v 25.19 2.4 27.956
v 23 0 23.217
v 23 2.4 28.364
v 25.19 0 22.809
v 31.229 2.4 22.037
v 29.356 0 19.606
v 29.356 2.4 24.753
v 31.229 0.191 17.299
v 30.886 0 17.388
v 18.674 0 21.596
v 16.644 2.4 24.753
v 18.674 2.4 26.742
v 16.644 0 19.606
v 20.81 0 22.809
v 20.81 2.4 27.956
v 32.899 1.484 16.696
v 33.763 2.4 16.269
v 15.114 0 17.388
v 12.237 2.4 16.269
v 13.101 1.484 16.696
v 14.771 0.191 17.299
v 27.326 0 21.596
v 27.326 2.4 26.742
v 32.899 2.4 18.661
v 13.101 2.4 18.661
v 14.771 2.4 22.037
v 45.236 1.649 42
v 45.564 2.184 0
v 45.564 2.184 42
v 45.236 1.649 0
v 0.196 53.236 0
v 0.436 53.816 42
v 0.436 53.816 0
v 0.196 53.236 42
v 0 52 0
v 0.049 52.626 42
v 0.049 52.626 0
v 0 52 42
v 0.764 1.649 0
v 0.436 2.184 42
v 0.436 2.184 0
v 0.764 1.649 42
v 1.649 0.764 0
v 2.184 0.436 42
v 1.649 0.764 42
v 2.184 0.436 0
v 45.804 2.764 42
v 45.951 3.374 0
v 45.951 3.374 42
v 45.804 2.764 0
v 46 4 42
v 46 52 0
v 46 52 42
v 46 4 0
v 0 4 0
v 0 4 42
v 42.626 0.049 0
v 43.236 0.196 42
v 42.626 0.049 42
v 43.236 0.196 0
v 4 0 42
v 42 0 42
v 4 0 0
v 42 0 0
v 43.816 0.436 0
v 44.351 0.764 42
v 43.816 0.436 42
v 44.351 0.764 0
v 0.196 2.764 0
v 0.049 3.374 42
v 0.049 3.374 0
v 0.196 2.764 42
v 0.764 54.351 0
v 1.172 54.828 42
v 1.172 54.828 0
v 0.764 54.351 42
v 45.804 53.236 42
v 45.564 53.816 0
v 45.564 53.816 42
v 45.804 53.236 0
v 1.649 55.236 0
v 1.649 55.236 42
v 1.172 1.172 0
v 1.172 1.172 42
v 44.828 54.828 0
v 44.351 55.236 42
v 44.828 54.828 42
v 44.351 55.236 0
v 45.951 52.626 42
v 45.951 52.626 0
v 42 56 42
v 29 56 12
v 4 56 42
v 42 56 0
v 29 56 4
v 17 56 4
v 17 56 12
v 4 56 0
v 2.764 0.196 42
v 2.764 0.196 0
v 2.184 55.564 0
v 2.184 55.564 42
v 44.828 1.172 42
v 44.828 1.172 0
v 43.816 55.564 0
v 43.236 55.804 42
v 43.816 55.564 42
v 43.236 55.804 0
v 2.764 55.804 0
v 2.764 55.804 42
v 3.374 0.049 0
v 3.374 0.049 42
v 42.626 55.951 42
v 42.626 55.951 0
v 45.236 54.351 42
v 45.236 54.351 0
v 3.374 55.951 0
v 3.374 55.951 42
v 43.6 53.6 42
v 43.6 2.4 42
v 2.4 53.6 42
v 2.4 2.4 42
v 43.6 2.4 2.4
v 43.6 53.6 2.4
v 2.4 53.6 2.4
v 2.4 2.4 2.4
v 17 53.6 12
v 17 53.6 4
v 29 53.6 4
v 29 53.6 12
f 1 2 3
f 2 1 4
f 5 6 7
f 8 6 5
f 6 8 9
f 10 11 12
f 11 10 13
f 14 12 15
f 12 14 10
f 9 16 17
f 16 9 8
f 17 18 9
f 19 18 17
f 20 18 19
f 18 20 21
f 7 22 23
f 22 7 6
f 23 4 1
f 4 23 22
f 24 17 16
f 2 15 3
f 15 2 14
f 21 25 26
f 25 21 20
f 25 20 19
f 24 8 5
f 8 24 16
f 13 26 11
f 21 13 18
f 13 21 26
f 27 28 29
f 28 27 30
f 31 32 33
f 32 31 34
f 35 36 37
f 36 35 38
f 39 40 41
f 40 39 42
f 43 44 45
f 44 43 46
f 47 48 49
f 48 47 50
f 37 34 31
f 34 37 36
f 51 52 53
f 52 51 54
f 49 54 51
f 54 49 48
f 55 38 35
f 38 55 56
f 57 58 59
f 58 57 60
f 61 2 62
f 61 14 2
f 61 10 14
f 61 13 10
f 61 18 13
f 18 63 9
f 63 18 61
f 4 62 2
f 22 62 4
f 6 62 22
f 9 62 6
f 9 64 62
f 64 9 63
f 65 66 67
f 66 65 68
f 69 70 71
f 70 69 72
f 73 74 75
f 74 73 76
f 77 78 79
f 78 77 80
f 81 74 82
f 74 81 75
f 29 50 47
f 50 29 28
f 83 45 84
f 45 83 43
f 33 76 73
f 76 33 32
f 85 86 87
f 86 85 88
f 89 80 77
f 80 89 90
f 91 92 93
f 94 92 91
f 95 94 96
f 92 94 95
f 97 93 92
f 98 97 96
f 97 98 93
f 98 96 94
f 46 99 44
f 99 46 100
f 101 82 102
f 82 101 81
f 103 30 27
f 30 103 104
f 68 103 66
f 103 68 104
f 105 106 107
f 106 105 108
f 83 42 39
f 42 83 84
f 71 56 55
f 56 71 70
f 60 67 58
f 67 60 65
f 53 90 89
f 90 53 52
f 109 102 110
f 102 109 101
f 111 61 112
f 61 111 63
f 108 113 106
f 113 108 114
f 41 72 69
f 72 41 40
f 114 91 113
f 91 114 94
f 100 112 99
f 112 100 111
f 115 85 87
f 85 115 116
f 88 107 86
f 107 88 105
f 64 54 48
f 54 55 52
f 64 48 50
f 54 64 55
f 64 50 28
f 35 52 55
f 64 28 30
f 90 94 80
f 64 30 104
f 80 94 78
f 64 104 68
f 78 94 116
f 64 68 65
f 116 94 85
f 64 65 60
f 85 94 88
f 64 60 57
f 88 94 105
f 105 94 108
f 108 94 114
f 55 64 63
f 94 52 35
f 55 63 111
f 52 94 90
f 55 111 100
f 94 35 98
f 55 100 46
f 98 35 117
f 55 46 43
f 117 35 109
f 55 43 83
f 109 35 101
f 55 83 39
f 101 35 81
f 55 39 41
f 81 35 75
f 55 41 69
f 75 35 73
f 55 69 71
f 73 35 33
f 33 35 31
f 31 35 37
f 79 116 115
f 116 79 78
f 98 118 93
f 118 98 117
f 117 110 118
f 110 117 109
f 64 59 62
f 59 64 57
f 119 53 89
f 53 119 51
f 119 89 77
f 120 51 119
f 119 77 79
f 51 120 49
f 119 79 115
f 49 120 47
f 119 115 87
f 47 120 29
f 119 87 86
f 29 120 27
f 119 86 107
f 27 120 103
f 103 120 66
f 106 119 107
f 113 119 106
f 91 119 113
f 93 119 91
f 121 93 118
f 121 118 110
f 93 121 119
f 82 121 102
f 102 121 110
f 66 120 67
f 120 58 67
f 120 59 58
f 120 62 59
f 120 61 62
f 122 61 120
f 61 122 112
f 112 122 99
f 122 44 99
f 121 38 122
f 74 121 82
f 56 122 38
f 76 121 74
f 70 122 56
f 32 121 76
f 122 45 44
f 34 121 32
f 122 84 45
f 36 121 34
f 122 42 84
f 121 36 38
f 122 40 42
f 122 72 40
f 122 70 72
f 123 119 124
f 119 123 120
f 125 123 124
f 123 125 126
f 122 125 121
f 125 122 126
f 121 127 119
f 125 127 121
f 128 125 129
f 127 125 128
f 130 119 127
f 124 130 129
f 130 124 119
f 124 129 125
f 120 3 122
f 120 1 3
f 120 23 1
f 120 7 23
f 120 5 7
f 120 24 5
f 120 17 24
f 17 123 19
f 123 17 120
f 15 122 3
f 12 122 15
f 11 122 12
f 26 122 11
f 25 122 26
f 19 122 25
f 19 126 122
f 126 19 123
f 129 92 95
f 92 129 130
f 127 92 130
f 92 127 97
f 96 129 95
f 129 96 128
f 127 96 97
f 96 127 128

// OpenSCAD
// =============================================================================
// J.A.R.V.I.S. - MÓDULO 3: POD ACÚSTICO SATÉLITE (SOM & VOZ DEDICADOS)
// =============================================================================
// Módulo de bancada independente (Estilo Reator Arc / Mini Torre Studio):
//   - Aloja o Alto-falante 4 Ohm 3W (27.8 x 36.7 mm) com câmara acústica dedicada
//   - Aloja o Microfone MEMS I2S INMP441 (13.6 mm) em cápsula isolada antirruído
//   - Pode ser posicionado em qualquer lugar da bancada ou acoplado ao console
//   - Elimina 100% de autofeedback acústico entre a voz do Jarvis e a tela touch
// =============================================================================

$fn = 40;

folga = 0.4;
parede = 2.4;

// Dimensões do Alto-falante (27.8 x 36.7 mm)
falante_w = 27.8 + folga;
falante_l = 36.7 + folga;
falante_prof = 11.0;

// Dimensões do Microfone INMP441
mic_d = 13.6 + folga;

// Dimensões do Pod Acústico
pod_w = 46.0;
pod_l = 56.0;
pod_h = 42.0;
inclinacao = 65; // Inclinado 65 graus apontando direto para a cabeça do usuário

module pod_acustico_corpo() {
    difference() {
        // Gabinete futurista arredondado
        hull() {
            translate([4, 4, 0]) cylinder(r=4, h=pod_h);
            translate([pod_w - 4, 4, 0]) cylinder(r=4, h=pod_h);
            translate([pod_w - 4, pod_l - 4, 0]) cylinder(r=4, h=pod_h);
            translate([4, pod_l - 4, 0]) cylinder(r=4, h=pod_h);
        }

        // Cavidade acústica traseira selada para o alto-falante (~25 cm³)
        translate([parede, parede, parede])
            cube([pod_w - (parede*2), pod_l - (parede*2), pod_h - parede]);

        // Frontal inclinado com grelha de som e pórtico de mic
        translate([pod_w/2, 10, pod_h/2])
            rotate([inclinacao - 90, 0, 0]) {
                // Abertura do alto-falante
                translate([0, 4, 0]) {
                    // Grelha tipo Reator Arc com ranhuras concêntricas
                    cylinder(d=28.0, h=15, center=true);
                }

                // Orifício isolado do microfone MEMS (Ø 2.5 mm)
                translate([0, -18, 0])
                    cylinder(d=2.6, h=15, center=true);
            }

        // Passa-cabos traseiro para chicote de áudio (I2S MAX98357A + INMP441)
        translate([pod_w/2, pod_l - 1, 8])
            cube([12, parede + 2, 8], center=true);

        // Furos M2.5 para fixação do falante
        translate([pod_w/2, 10, pod_h/2])
            rotate([inclinacao - 90, 0, 0]) {
                translate([-falante_w/2, 4, 0]) cylinder(d=2.6, h=15, center=true);
                translate([falante_w/2, 4, 0]) cylinder(d=2.6, h=15, center=true);
            }
    }
}

// Tampa traseira selada com ranhuras de descompressão acústica
module tampa_pod_acustico() {
    difference() {
        cube([pod_w - 0.4, pod_l - 0.4, 2.0]);
        // 4 furos M2.5 de fechamento
        for (pos = [[5, 5], [pod_w - 5, 5], [pod_w - 5, pod_l - 5], [5, pod_l - 5]]) {
            translate([pos[0], pos[1], -0.5])
                cylinder(d=2.8, h=3);
        }
    }
}

// Renderização principal do Pod
pod_acustico_corpo();
